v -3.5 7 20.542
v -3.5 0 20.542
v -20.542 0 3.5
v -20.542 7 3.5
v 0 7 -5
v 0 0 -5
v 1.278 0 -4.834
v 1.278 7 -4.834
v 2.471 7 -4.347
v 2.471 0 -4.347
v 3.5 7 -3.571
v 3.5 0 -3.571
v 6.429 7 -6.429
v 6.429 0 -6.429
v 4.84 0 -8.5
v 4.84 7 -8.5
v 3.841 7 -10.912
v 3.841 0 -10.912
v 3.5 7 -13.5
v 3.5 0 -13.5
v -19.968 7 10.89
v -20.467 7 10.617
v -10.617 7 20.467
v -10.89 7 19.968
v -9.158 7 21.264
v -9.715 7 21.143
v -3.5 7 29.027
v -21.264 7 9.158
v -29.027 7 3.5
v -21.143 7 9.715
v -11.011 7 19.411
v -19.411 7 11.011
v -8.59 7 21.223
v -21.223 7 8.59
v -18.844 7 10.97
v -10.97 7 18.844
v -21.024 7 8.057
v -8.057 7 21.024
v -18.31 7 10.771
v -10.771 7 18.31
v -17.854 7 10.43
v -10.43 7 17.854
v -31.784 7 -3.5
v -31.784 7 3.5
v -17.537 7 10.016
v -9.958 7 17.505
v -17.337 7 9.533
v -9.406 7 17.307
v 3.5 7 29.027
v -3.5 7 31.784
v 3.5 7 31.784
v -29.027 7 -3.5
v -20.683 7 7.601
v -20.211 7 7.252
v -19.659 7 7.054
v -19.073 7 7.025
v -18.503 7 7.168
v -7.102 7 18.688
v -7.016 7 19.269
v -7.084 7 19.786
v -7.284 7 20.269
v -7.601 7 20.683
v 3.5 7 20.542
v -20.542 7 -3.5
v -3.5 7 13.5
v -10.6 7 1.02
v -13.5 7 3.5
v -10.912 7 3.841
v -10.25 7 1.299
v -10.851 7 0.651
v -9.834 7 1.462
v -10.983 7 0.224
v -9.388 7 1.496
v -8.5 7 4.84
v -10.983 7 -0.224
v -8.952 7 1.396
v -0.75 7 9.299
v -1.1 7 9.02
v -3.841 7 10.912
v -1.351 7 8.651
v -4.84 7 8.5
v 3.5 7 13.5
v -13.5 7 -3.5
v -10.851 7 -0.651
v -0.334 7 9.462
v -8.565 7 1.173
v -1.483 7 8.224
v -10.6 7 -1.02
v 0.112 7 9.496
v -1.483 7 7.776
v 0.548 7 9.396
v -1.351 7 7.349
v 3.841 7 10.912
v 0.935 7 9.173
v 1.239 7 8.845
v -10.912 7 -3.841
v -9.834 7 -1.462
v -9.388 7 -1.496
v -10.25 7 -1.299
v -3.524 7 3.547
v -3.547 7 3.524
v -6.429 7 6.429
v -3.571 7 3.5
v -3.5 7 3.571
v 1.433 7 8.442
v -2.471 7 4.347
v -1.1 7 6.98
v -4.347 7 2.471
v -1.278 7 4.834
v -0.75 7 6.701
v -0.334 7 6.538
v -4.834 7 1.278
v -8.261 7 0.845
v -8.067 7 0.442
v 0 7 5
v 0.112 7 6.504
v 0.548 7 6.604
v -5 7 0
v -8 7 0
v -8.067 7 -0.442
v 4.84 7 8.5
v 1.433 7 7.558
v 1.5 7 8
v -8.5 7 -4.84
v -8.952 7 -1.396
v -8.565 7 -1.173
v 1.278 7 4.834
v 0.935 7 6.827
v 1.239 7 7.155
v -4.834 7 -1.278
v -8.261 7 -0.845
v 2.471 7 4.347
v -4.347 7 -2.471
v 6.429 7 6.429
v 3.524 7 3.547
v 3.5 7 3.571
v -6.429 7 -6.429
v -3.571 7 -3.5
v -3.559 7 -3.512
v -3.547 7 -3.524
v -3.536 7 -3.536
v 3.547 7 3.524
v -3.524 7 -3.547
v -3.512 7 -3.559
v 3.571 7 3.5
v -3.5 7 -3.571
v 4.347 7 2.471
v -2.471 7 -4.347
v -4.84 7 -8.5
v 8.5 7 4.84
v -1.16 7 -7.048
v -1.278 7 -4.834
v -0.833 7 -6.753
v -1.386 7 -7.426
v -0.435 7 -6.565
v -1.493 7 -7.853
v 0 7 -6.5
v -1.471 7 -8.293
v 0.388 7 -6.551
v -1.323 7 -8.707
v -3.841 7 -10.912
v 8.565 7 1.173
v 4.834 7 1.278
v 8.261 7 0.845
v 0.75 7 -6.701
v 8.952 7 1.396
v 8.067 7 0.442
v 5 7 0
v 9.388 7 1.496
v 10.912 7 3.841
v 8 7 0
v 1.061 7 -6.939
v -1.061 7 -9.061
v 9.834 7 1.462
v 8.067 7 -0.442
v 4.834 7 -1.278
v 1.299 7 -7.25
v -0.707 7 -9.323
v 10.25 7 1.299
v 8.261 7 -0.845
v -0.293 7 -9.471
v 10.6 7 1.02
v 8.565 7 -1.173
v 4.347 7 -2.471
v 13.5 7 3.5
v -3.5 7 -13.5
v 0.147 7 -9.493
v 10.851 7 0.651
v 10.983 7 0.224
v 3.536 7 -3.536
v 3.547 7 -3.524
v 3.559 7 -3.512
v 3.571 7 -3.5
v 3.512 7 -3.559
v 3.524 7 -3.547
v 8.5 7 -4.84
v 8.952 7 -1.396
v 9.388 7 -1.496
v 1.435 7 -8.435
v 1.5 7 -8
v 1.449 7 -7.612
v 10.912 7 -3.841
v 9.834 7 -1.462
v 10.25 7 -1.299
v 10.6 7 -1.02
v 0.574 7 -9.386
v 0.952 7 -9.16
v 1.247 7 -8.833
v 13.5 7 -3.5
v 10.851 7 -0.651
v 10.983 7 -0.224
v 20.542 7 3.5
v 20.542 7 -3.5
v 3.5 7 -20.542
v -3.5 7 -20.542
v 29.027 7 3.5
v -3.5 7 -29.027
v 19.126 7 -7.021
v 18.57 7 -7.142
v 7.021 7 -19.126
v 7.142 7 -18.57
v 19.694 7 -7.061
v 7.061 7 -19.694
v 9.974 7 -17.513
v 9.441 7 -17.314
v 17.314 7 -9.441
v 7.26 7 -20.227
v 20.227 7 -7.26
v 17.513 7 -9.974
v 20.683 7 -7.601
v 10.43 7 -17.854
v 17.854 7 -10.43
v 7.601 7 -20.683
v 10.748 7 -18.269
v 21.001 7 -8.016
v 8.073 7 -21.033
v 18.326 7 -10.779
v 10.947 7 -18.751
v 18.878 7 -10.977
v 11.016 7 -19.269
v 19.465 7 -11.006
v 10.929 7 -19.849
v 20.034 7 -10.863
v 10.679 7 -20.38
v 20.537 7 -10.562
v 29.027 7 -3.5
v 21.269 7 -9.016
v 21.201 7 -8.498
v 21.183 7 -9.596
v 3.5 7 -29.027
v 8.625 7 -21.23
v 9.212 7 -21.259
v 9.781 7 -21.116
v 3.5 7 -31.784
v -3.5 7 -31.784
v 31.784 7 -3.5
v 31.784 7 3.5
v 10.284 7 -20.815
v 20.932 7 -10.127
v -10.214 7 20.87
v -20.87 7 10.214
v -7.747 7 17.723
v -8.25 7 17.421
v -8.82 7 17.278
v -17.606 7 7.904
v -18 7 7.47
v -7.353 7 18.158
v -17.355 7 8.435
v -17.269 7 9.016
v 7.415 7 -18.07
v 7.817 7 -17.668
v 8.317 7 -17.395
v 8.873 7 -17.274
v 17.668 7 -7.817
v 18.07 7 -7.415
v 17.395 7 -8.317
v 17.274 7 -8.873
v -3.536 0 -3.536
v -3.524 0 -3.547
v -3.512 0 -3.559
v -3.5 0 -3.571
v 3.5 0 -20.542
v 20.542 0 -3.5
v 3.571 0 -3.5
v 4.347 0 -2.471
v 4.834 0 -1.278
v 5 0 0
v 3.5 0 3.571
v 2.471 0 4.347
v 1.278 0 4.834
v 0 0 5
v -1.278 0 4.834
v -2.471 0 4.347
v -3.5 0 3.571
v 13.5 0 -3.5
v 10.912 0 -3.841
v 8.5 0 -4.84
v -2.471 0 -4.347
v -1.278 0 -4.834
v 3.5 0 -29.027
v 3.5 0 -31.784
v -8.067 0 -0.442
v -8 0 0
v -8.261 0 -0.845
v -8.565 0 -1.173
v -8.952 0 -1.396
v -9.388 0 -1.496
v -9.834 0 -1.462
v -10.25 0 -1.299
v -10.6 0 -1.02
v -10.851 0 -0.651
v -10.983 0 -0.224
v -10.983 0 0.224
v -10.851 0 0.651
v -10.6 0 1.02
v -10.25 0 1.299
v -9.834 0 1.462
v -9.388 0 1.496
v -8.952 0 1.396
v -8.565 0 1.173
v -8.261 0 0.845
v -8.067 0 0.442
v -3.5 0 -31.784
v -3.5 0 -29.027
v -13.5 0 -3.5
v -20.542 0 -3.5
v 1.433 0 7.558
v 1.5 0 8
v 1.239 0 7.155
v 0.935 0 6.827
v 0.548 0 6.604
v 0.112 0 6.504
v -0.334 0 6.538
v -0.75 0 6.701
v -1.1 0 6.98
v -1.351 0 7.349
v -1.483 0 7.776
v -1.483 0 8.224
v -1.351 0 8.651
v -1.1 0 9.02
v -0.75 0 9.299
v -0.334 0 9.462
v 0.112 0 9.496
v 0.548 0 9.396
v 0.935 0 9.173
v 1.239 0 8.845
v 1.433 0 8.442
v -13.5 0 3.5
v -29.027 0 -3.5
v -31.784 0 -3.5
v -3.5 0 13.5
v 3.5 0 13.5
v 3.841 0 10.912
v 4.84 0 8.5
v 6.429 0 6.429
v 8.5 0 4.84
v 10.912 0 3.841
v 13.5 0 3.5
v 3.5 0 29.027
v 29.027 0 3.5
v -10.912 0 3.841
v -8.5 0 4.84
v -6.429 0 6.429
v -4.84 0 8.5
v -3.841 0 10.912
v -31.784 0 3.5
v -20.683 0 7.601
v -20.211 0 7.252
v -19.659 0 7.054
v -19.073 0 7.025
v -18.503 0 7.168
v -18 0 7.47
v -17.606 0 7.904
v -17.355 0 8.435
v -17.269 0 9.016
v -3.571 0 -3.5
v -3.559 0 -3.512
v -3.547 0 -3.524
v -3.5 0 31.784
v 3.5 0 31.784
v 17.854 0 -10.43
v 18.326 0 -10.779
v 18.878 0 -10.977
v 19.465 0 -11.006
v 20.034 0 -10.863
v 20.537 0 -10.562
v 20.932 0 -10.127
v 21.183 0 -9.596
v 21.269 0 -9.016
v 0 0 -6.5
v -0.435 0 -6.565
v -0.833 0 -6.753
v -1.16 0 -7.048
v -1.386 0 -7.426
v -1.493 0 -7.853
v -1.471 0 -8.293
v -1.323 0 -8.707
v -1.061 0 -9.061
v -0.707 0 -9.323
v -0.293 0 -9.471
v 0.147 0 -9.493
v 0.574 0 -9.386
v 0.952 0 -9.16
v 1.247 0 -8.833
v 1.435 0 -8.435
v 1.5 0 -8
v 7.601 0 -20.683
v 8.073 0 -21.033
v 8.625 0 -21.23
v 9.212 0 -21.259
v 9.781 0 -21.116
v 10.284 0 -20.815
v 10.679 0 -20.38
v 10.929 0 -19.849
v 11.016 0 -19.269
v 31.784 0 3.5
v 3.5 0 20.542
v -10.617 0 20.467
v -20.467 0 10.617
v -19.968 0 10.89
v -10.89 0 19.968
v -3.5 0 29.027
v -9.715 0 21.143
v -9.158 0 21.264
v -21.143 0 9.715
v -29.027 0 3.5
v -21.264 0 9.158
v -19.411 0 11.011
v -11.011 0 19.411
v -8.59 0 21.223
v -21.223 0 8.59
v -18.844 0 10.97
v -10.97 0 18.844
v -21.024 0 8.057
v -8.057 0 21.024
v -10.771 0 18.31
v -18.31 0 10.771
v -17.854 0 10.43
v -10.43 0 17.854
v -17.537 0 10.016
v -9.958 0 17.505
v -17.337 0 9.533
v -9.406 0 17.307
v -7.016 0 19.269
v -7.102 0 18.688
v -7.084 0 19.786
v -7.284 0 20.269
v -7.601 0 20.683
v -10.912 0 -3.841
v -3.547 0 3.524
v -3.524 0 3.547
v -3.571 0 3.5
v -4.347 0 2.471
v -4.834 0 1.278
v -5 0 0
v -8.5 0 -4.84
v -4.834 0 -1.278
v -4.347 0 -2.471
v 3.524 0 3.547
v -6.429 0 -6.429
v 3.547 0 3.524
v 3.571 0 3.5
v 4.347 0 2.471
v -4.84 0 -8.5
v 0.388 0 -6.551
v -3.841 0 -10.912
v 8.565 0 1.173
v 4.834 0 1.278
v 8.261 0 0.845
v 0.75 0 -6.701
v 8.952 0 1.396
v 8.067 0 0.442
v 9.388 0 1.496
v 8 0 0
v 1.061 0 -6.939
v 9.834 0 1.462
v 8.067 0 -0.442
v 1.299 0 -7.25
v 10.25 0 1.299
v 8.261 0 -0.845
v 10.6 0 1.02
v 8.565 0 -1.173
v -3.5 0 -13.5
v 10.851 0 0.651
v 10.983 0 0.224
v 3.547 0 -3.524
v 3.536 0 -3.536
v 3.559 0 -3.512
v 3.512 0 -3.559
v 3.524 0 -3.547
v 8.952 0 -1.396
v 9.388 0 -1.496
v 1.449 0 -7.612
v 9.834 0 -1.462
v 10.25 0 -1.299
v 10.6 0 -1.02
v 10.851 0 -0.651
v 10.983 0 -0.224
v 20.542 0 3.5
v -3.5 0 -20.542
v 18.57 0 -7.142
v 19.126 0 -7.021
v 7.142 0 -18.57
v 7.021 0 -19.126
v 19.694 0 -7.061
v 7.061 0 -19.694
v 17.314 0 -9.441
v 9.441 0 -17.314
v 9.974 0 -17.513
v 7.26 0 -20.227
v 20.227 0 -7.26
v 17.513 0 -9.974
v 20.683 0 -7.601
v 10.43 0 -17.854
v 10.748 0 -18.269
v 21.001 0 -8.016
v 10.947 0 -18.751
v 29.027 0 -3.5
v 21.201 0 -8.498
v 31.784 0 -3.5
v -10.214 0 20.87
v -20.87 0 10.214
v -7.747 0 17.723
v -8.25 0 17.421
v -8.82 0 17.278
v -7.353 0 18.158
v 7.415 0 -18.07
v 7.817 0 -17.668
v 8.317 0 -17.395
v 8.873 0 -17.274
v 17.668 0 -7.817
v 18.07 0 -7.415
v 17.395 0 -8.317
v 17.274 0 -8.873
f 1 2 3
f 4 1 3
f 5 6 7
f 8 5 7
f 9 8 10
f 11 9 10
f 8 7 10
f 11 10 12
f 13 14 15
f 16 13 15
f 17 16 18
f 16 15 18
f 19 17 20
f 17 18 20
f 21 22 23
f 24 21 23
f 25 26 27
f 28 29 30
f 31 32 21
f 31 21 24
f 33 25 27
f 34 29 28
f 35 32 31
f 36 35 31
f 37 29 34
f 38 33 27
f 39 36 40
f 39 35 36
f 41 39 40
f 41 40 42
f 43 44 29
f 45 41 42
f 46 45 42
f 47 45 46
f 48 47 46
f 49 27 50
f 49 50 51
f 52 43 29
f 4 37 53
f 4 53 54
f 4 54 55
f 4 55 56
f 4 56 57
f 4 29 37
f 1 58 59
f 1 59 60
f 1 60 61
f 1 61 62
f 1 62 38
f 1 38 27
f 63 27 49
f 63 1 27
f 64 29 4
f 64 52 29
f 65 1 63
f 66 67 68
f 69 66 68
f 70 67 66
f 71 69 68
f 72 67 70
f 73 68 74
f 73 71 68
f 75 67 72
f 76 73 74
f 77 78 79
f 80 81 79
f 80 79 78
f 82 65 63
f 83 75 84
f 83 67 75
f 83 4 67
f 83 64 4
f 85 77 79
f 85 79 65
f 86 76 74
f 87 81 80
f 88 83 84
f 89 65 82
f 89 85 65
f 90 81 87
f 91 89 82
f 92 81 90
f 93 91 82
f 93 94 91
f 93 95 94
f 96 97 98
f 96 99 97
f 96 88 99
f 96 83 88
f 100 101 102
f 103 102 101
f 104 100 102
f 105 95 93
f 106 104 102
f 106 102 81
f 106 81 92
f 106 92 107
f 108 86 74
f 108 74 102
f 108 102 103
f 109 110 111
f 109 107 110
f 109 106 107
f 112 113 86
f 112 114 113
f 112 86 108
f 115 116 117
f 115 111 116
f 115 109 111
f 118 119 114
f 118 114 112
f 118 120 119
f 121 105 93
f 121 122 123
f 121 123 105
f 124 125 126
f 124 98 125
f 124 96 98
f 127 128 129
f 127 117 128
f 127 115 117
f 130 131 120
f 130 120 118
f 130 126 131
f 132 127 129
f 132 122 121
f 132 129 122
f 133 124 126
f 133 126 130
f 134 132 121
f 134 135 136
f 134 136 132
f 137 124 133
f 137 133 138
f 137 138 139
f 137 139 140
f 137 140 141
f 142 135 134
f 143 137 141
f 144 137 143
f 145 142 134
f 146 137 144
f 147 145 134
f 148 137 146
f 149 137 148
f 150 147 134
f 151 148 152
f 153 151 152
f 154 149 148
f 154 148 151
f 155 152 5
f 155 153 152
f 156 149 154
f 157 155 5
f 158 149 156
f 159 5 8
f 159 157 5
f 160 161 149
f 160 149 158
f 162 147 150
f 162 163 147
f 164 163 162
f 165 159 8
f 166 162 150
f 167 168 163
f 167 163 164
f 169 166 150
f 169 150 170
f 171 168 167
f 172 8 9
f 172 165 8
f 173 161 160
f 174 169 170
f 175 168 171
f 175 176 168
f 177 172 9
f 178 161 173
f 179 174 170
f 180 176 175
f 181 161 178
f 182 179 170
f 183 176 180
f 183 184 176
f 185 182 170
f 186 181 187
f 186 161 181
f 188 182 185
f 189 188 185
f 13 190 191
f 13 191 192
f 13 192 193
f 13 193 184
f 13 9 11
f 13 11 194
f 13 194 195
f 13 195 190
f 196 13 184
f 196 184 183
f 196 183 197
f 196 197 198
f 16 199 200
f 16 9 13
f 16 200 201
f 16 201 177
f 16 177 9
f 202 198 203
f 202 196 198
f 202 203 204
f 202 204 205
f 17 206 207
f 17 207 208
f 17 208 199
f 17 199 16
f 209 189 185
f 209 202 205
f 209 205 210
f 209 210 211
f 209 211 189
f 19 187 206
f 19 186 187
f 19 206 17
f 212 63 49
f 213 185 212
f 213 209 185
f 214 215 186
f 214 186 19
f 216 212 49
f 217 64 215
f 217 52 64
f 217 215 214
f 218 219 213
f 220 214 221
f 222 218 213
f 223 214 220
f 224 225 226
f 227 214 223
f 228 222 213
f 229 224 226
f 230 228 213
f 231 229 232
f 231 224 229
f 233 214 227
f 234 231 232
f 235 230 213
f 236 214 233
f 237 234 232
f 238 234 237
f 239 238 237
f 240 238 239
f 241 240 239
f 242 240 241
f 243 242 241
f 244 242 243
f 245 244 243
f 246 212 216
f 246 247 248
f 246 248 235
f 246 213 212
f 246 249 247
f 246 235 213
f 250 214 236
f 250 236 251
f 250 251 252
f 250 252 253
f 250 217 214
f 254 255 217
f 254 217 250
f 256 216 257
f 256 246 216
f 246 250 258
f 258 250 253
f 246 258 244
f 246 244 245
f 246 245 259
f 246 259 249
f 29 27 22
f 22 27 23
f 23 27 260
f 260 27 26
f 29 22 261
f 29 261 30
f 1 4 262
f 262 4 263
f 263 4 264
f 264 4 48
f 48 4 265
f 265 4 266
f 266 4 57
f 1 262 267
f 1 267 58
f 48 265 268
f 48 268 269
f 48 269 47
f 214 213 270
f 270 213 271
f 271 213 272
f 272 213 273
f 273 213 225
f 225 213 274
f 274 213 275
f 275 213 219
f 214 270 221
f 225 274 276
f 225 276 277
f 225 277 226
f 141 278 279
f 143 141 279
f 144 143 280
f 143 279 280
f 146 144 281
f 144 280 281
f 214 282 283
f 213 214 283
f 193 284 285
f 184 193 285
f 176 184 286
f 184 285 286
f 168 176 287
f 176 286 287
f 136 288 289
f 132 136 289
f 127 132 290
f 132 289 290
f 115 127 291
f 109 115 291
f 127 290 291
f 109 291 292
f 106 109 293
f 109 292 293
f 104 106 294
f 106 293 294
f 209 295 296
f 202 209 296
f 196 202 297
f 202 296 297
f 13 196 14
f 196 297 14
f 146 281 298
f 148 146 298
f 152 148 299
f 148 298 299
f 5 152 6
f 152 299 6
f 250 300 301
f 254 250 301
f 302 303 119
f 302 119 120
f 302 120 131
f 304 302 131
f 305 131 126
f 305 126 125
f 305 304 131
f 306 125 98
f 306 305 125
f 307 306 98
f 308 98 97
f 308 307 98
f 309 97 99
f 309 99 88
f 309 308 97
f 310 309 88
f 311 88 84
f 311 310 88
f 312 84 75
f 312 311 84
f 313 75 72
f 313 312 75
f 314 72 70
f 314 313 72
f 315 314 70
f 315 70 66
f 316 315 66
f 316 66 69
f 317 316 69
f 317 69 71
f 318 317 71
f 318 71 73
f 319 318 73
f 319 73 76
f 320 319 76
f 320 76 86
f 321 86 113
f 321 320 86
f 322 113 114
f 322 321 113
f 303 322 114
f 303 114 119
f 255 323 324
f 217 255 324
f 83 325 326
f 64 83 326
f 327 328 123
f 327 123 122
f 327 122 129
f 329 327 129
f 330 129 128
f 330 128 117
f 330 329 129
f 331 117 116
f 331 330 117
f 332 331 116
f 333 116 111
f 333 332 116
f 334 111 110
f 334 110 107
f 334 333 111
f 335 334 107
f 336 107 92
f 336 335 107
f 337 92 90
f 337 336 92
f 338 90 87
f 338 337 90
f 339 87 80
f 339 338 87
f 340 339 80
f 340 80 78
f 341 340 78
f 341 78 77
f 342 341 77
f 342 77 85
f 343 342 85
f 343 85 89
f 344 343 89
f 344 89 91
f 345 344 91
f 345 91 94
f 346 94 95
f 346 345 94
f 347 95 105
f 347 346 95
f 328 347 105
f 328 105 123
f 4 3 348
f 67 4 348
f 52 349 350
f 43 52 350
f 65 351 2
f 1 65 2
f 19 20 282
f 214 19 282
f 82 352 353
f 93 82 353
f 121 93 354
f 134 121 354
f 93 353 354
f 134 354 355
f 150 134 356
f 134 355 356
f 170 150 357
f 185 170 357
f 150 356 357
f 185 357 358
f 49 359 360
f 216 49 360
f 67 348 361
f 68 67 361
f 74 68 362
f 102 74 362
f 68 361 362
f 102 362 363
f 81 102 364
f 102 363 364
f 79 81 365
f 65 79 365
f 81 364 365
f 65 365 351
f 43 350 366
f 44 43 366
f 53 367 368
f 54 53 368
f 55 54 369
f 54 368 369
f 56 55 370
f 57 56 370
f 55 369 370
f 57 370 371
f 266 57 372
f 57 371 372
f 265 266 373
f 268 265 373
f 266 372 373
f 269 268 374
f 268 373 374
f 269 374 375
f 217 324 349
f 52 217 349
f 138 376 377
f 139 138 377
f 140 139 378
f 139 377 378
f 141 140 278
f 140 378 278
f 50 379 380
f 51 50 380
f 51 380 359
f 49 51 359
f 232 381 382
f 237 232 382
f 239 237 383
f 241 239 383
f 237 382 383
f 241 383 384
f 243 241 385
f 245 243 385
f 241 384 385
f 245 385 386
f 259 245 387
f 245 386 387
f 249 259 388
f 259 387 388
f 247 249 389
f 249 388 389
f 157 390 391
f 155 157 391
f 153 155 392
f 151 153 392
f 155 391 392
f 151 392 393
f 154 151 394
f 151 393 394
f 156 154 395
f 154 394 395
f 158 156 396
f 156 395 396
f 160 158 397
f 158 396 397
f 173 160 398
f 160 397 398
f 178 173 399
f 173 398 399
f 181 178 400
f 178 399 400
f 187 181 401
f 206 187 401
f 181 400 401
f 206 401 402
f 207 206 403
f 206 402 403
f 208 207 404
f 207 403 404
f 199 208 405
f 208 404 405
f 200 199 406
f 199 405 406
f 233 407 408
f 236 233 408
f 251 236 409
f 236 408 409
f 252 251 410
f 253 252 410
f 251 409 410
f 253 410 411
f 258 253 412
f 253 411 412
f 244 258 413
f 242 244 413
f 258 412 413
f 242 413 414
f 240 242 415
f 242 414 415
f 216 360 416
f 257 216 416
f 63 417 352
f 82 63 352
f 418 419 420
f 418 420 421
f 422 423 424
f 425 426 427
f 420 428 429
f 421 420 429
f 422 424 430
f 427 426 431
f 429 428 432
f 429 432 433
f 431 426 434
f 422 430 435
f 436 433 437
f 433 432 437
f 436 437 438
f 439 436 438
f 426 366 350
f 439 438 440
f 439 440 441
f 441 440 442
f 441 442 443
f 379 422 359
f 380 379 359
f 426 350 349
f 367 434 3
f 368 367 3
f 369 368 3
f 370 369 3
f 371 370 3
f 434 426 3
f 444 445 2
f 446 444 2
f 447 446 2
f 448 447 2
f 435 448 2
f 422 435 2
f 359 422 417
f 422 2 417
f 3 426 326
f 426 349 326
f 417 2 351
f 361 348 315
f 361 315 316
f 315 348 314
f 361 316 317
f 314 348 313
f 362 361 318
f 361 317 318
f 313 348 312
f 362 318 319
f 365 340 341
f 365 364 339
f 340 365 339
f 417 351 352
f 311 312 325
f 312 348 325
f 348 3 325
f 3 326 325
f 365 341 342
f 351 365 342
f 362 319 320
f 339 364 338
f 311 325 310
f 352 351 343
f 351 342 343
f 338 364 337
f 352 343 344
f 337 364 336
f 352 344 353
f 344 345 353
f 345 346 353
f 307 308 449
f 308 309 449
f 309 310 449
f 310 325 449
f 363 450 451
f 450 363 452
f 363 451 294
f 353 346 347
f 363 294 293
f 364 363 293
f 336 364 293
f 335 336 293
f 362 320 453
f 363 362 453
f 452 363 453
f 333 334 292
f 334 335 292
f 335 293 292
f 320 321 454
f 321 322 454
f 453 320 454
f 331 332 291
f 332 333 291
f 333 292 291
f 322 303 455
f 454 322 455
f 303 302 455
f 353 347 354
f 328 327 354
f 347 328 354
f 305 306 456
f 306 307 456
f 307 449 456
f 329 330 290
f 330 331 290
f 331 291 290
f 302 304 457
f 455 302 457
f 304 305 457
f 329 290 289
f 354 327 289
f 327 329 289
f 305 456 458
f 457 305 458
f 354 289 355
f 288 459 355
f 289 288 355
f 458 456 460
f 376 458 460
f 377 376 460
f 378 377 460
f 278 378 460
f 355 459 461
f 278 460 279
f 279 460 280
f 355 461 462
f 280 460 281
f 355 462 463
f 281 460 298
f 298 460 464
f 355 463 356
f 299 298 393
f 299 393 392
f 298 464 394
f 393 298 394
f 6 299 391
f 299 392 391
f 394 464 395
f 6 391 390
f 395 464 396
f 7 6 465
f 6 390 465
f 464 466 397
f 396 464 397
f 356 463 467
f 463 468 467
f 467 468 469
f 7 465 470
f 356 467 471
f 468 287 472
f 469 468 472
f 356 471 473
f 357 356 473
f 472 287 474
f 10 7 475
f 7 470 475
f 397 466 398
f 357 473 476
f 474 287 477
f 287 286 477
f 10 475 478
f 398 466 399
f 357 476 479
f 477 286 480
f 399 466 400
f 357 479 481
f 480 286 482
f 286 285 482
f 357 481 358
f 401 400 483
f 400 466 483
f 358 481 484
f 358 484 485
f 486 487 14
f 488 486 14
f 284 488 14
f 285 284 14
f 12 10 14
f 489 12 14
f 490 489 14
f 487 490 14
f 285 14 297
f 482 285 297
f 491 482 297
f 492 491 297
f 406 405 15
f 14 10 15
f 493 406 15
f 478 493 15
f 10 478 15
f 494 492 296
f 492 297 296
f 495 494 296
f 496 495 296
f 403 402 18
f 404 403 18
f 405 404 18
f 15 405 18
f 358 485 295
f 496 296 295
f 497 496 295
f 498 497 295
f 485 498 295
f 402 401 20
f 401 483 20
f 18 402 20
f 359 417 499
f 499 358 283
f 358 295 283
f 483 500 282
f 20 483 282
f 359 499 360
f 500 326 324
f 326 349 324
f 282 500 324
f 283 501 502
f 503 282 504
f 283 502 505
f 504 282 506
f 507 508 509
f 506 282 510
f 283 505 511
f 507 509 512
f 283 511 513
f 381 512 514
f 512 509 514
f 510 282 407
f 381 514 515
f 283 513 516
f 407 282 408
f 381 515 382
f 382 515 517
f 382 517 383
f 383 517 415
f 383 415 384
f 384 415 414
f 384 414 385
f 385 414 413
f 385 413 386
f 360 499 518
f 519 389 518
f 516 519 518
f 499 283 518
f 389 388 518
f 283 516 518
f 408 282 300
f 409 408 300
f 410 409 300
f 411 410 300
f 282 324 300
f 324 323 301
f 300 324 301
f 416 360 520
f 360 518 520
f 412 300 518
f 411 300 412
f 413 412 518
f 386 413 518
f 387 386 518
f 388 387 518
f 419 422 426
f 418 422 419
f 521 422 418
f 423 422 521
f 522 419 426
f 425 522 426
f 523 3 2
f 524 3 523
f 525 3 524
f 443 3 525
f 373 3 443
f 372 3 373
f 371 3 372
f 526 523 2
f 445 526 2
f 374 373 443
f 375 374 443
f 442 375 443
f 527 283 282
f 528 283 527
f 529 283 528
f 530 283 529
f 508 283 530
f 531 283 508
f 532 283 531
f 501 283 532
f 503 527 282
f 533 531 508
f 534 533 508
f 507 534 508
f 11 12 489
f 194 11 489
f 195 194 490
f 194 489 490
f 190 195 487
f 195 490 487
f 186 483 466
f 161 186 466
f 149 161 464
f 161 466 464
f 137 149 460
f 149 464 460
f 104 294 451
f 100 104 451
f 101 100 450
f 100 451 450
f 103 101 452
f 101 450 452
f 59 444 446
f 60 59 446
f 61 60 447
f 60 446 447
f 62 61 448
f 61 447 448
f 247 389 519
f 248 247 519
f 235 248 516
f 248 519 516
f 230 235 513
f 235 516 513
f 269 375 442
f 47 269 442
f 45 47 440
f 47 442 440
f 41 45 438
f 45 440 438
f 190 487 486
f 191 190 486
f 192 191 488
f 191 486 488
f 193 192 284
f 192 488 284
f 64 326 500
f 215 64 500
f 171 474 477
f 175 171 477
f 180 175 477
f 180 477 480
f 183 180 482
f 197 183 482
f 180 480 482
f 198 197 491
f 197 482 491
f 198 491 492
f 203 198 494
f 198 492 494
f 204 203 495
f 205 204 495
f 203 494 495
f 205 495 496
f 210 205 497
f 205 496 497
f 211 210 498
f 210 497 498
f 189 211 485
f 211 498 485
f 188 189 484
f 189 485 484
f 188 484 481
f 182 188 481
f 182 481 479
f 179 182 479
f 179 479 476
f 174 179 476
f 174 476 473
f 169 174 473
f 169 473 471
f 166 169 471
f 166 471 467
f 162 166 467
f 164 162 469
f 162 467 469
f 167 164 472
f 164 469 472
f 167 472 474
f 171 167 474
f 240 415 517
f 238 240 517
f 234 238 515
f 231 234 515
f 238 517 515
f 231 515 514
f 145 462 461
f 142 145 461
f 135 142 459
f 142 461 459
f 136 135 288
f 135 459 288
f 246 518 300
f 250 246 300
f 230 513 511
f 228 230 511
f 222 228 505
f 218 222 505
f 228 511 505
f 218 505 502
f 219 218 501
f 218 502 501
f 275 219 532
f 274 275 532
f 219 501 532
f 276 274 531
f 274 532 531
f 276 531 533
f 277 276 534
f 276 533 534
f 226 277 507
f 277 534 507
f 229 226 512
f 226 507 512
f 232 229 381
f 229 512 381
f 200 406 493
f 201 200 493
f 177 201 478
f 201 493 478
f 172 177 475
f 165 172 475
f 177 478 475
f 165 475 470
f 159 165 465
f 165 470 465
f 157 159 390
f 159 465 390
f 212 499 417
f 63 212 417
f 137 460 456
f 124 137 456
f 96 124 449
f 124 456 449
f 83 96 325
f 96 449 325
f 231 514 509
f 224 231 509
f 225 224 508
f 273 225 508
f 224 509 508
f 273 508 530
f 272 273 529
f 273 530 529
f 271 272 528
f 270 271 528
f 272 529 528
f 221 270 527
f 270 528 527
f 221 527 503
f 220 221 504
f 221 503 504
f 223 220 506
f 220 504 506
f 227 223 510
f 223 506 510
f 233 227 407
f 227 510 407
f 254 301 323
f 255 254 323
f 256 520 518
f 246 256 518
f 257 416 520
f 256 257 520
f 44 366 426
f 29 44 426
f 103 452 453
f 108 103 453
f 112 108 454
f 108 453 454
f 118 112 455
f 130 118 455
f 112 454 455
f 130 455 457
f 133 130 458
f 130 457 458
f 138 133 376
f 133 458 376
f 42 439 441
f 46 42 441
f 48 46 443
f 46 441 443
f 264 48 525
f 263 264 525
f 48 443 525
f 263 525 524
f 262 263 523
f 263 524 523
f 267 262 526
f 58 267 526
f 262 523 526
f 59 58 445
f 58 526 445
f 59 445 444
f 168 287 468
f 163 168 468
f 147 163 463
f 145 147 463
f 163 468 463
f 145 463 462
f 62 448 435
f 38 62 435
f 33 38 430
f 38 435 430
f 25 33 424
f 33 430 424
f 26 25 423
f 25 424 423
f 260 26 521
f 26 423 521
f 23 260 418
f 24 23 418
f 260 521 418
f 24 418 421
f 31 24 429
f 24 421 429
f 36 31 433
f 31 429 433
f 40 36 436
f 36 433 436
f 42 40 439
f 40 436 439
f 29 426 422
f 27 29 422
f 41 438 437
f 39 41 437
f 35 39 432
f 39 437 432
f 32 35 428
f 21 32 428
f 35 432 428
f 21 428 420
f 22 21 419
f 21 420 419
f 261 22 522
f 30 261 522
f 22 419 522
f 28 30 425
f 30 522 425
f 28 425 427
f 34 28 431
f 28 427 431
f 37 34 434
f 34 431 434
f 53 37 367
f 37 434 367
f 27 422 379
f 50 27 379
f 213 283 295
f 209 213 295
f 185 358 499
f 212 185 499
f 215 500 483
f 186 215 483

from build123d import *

# Parameters (mm, degrees)
SKETCH1_R           = 1.5
BOSS_EXTRUDE1_DEPTH = 7


with BuildPart() as part:
    # Sketch1 → Boss-Extrude1 (new body)
    with BuildSketch(Plane(origin=(0, 0, 0), x_dir=(1, 0, 0), z_dir=(0, 1, 0))):
        Polygon((-3.5, -29.026911935), (-3.5, -31.784271247), (3.5, -31.784271247), (3.5, -29.026911935), (29.026911935, -3.5), (31.784271247, -3.5), (31.784271247, 3.5), (29.026911935, 3.5), (3.5, 29.026911935), (3.5, 31.784271247), (-3.5, 31.784271247), (-3.5, 29.026911935), (-29.026911935, 3.5), (-31.784271247, 3.5), (-31.784271247, 0.742640687), (-31.784271247, -3.5), (-29.026911935, -3.5), align=None)
        with BuildLine():
            ThreePointArc((-7.01561146, -19.268659787), (-7.167852395, -20.034026652), (-7.601397898, -20.68287335))
            ThreePointArc((-7.601397898, -20.68287335), (-10.429825023, -20.68287335), (-10.429825023, -17.854446225))
            ThreePointArc((-10.429825023, -17.854446225), (-8.250244595, -17.420900722), (-7.01561146, -19.268659787))
        make_face(mode=Mode.SUBTRACT)
        with BuildLine():
            ThreePointArc((-17.854446225, -10.429825023), (-20.68287335, -10.429825023), (-20.68287335, -7.601397898))
            ThreePointArc((-20.68287335, -7.601397898), (-18.503292923, -7.167852395), (-17.268659787, -9.01561146))
            ThreePointArc((-17.268659787, -9.01561146), (-17.420900722, -9.780978325), (-17.854446225, -10.429825023))
        make_face(mode=Mode.SUBTRACT)
        with BuildLine():
            Line((-3.5, -13.5), (-3.5, -20.54163056))
            Line((-3.5, -20.54163056), (-20.54163056, -3.5))
            Line((-20.54163056, -3.5), (-13.5, -3.5))
            ThreePointArc((-13.5, -3.5), (-6.428932188, -6.428932188), (-3.5, -13.5))
        make_face(mode=Mode.SUBTRACT)
        with Locations((0, -8)):
            Circle(SKETCH1_R, mode=Mode.SUBTRACT)
        with BuildLine():
            ThreePointArc((3.5, -13.5), (6.428932188, -6.428932188), (13.5, -3.5))
            Line((13.5, -3.5), (20.54163056, -3.5))
            Line((20.54163056, -3.5), (3.5, -20.54163056))
            Line((3.5, -20.54163056), (3.5, -13.5))
        make_face(mode=Mode.SUBTRACT)
        with Locations((-9.5, 0)):
            Circle(SKETCH1_R, mode=Mode.SUBTRACT)
        with BuildLine():
            Line((-20.54163056, 3.5), (-3.5, 20.54163056))
            Line((-3.5, 20.54163056), (-3.5, 13.5))
            ThreePointArc((-3.5, 13.5), (-4.261204675, 9.673165676), (-6.428932188, 6.428932188))
            ThreePointArc((-6.428932188, 6.428932188), (-9.673165676, 4.261204675), (-13.5, 3.5))
            Line((-13.5, 3.5), (-20.54163056, 3.5))
        make_face(mode=Mode.SUBTRACT)
        with BuildLine():
            ThreePointArc((3.570714214, 3.5), (4.628907596, 1.890294809), (5, 0))
            ThreePointArc((5, 0), (4.628907596, -1.890294809), (3.570714214, -3.5))
            ThreePointArc((3.570714214, -3.5), (3.535533906, -3.535533906), (3.5, -3.570714214))
            ThreePointArc((3.5, -3.570714214), (0, -5), (-3.5, -3.570714214))
            ThreePointArc((-3.5, -3.570714214), (-3.535533906, -3.535533906), (-3.570714214, -3.5))
            ThreePointArc((-3.570714214, -3.5), (-5, 0), (-3.570714214, 3.5))
            ThreePointArc((-3.570714214, 3.5), (-3.553168481, 3.517810931), (-3.535533906, 3.535533906))
            ThreePointArc((-3.535533906, 3.535533906), (-3.517810931, 3.553168481), (-3.5, 3.570714214))
            ThreePointArc((-3.5, 3.570714214), (-1.890294809, 4.628907596), (0, 5))
            ThreePointArc((0, 5), (1.890294809, 4.628907596), (3.5, 3.570714214))
            ThreePointArc((3.5, 3.570714214), (3.517810931, 3.553168481), (3.535533906, 3.535533906))
            ThreePointArc((3.535533906, 3.535533906), (3.553168481, 3.517810931), (3.570714214, 3.5))
        make_face(mode=Mode.SUBTRACT)
        with BuildLine():
            ThreePointArc((11, 0), (9.5, -1.5), (8, 0))
            ThreePointArc((8, 0), (9.5, 1.5), (11, 0))
        make_face(mode=Mode.SUBTRACT)
        with BuildLine():
            ThreePointArc((0, 6.5), (-1.060660172, 9.060660172), (1.5, 8))
            ThreePointArc((1.5, 8), (1.060660172, 6.939339828), (0, 6.5))
        make_face(mode=Mode.SUBTRACT)
        with BuildLine():
            ThreePointArc((13.5, 3.5), (9.673165676, 4.261204675), (6.428932188, 6.428932188))
            ThreePointArc((6.428932188, 6.428932188), (4.261204675, 9.673165676), (3.5, 13.5))
            Line((3.5, 13.5), (3.5, 20.54163056))
            Line((3.5, 20.54163056), (12.02081528, 12.02081528))
            Line((12.02081528, 12.02081528), (20.54163056, 3.5))
            Line((20.54163056, 3.5), (13.5, 3.5))
        make_face(mode=Mode.SUBTRACT)
        with BuildLine():
            ThreePointArc((20.68287335, 7.601397898), (17.854446225, 7.601397898), (17.854446225, 10.429825023))
            ThreePointArc((17.854446225, 10.429825023), (20.034026652, 10.863370525), (21.268659787, 9.01561146))
            ThreePointArc((21.268659787, 9.01561146), (21.116418852, 8.250244595), (20.68287335, 7.601397898))
        make_face(mode=Mode.SUBTRACT)
        with BuildLine():
            ThreePointArc((10.429825023, 17.854446225), (7.601397898, 17.854446225), (7.601397898, 20.68287335))
            ThreePointArc((7.601397898, 20.68287335), (9.780978325, 21.116418852), (11.01561146, 19.268659787))
            ThreePointArc((11.01561146, 19.268659787), (10.863370525, 18.503292923), (10.429825023, 17.854446225))
        make_face(mode=Mode.SUBTRACT)
    extrude(amount=BOSS_EXTRUDE1_DEPTH)


solid = part.part
